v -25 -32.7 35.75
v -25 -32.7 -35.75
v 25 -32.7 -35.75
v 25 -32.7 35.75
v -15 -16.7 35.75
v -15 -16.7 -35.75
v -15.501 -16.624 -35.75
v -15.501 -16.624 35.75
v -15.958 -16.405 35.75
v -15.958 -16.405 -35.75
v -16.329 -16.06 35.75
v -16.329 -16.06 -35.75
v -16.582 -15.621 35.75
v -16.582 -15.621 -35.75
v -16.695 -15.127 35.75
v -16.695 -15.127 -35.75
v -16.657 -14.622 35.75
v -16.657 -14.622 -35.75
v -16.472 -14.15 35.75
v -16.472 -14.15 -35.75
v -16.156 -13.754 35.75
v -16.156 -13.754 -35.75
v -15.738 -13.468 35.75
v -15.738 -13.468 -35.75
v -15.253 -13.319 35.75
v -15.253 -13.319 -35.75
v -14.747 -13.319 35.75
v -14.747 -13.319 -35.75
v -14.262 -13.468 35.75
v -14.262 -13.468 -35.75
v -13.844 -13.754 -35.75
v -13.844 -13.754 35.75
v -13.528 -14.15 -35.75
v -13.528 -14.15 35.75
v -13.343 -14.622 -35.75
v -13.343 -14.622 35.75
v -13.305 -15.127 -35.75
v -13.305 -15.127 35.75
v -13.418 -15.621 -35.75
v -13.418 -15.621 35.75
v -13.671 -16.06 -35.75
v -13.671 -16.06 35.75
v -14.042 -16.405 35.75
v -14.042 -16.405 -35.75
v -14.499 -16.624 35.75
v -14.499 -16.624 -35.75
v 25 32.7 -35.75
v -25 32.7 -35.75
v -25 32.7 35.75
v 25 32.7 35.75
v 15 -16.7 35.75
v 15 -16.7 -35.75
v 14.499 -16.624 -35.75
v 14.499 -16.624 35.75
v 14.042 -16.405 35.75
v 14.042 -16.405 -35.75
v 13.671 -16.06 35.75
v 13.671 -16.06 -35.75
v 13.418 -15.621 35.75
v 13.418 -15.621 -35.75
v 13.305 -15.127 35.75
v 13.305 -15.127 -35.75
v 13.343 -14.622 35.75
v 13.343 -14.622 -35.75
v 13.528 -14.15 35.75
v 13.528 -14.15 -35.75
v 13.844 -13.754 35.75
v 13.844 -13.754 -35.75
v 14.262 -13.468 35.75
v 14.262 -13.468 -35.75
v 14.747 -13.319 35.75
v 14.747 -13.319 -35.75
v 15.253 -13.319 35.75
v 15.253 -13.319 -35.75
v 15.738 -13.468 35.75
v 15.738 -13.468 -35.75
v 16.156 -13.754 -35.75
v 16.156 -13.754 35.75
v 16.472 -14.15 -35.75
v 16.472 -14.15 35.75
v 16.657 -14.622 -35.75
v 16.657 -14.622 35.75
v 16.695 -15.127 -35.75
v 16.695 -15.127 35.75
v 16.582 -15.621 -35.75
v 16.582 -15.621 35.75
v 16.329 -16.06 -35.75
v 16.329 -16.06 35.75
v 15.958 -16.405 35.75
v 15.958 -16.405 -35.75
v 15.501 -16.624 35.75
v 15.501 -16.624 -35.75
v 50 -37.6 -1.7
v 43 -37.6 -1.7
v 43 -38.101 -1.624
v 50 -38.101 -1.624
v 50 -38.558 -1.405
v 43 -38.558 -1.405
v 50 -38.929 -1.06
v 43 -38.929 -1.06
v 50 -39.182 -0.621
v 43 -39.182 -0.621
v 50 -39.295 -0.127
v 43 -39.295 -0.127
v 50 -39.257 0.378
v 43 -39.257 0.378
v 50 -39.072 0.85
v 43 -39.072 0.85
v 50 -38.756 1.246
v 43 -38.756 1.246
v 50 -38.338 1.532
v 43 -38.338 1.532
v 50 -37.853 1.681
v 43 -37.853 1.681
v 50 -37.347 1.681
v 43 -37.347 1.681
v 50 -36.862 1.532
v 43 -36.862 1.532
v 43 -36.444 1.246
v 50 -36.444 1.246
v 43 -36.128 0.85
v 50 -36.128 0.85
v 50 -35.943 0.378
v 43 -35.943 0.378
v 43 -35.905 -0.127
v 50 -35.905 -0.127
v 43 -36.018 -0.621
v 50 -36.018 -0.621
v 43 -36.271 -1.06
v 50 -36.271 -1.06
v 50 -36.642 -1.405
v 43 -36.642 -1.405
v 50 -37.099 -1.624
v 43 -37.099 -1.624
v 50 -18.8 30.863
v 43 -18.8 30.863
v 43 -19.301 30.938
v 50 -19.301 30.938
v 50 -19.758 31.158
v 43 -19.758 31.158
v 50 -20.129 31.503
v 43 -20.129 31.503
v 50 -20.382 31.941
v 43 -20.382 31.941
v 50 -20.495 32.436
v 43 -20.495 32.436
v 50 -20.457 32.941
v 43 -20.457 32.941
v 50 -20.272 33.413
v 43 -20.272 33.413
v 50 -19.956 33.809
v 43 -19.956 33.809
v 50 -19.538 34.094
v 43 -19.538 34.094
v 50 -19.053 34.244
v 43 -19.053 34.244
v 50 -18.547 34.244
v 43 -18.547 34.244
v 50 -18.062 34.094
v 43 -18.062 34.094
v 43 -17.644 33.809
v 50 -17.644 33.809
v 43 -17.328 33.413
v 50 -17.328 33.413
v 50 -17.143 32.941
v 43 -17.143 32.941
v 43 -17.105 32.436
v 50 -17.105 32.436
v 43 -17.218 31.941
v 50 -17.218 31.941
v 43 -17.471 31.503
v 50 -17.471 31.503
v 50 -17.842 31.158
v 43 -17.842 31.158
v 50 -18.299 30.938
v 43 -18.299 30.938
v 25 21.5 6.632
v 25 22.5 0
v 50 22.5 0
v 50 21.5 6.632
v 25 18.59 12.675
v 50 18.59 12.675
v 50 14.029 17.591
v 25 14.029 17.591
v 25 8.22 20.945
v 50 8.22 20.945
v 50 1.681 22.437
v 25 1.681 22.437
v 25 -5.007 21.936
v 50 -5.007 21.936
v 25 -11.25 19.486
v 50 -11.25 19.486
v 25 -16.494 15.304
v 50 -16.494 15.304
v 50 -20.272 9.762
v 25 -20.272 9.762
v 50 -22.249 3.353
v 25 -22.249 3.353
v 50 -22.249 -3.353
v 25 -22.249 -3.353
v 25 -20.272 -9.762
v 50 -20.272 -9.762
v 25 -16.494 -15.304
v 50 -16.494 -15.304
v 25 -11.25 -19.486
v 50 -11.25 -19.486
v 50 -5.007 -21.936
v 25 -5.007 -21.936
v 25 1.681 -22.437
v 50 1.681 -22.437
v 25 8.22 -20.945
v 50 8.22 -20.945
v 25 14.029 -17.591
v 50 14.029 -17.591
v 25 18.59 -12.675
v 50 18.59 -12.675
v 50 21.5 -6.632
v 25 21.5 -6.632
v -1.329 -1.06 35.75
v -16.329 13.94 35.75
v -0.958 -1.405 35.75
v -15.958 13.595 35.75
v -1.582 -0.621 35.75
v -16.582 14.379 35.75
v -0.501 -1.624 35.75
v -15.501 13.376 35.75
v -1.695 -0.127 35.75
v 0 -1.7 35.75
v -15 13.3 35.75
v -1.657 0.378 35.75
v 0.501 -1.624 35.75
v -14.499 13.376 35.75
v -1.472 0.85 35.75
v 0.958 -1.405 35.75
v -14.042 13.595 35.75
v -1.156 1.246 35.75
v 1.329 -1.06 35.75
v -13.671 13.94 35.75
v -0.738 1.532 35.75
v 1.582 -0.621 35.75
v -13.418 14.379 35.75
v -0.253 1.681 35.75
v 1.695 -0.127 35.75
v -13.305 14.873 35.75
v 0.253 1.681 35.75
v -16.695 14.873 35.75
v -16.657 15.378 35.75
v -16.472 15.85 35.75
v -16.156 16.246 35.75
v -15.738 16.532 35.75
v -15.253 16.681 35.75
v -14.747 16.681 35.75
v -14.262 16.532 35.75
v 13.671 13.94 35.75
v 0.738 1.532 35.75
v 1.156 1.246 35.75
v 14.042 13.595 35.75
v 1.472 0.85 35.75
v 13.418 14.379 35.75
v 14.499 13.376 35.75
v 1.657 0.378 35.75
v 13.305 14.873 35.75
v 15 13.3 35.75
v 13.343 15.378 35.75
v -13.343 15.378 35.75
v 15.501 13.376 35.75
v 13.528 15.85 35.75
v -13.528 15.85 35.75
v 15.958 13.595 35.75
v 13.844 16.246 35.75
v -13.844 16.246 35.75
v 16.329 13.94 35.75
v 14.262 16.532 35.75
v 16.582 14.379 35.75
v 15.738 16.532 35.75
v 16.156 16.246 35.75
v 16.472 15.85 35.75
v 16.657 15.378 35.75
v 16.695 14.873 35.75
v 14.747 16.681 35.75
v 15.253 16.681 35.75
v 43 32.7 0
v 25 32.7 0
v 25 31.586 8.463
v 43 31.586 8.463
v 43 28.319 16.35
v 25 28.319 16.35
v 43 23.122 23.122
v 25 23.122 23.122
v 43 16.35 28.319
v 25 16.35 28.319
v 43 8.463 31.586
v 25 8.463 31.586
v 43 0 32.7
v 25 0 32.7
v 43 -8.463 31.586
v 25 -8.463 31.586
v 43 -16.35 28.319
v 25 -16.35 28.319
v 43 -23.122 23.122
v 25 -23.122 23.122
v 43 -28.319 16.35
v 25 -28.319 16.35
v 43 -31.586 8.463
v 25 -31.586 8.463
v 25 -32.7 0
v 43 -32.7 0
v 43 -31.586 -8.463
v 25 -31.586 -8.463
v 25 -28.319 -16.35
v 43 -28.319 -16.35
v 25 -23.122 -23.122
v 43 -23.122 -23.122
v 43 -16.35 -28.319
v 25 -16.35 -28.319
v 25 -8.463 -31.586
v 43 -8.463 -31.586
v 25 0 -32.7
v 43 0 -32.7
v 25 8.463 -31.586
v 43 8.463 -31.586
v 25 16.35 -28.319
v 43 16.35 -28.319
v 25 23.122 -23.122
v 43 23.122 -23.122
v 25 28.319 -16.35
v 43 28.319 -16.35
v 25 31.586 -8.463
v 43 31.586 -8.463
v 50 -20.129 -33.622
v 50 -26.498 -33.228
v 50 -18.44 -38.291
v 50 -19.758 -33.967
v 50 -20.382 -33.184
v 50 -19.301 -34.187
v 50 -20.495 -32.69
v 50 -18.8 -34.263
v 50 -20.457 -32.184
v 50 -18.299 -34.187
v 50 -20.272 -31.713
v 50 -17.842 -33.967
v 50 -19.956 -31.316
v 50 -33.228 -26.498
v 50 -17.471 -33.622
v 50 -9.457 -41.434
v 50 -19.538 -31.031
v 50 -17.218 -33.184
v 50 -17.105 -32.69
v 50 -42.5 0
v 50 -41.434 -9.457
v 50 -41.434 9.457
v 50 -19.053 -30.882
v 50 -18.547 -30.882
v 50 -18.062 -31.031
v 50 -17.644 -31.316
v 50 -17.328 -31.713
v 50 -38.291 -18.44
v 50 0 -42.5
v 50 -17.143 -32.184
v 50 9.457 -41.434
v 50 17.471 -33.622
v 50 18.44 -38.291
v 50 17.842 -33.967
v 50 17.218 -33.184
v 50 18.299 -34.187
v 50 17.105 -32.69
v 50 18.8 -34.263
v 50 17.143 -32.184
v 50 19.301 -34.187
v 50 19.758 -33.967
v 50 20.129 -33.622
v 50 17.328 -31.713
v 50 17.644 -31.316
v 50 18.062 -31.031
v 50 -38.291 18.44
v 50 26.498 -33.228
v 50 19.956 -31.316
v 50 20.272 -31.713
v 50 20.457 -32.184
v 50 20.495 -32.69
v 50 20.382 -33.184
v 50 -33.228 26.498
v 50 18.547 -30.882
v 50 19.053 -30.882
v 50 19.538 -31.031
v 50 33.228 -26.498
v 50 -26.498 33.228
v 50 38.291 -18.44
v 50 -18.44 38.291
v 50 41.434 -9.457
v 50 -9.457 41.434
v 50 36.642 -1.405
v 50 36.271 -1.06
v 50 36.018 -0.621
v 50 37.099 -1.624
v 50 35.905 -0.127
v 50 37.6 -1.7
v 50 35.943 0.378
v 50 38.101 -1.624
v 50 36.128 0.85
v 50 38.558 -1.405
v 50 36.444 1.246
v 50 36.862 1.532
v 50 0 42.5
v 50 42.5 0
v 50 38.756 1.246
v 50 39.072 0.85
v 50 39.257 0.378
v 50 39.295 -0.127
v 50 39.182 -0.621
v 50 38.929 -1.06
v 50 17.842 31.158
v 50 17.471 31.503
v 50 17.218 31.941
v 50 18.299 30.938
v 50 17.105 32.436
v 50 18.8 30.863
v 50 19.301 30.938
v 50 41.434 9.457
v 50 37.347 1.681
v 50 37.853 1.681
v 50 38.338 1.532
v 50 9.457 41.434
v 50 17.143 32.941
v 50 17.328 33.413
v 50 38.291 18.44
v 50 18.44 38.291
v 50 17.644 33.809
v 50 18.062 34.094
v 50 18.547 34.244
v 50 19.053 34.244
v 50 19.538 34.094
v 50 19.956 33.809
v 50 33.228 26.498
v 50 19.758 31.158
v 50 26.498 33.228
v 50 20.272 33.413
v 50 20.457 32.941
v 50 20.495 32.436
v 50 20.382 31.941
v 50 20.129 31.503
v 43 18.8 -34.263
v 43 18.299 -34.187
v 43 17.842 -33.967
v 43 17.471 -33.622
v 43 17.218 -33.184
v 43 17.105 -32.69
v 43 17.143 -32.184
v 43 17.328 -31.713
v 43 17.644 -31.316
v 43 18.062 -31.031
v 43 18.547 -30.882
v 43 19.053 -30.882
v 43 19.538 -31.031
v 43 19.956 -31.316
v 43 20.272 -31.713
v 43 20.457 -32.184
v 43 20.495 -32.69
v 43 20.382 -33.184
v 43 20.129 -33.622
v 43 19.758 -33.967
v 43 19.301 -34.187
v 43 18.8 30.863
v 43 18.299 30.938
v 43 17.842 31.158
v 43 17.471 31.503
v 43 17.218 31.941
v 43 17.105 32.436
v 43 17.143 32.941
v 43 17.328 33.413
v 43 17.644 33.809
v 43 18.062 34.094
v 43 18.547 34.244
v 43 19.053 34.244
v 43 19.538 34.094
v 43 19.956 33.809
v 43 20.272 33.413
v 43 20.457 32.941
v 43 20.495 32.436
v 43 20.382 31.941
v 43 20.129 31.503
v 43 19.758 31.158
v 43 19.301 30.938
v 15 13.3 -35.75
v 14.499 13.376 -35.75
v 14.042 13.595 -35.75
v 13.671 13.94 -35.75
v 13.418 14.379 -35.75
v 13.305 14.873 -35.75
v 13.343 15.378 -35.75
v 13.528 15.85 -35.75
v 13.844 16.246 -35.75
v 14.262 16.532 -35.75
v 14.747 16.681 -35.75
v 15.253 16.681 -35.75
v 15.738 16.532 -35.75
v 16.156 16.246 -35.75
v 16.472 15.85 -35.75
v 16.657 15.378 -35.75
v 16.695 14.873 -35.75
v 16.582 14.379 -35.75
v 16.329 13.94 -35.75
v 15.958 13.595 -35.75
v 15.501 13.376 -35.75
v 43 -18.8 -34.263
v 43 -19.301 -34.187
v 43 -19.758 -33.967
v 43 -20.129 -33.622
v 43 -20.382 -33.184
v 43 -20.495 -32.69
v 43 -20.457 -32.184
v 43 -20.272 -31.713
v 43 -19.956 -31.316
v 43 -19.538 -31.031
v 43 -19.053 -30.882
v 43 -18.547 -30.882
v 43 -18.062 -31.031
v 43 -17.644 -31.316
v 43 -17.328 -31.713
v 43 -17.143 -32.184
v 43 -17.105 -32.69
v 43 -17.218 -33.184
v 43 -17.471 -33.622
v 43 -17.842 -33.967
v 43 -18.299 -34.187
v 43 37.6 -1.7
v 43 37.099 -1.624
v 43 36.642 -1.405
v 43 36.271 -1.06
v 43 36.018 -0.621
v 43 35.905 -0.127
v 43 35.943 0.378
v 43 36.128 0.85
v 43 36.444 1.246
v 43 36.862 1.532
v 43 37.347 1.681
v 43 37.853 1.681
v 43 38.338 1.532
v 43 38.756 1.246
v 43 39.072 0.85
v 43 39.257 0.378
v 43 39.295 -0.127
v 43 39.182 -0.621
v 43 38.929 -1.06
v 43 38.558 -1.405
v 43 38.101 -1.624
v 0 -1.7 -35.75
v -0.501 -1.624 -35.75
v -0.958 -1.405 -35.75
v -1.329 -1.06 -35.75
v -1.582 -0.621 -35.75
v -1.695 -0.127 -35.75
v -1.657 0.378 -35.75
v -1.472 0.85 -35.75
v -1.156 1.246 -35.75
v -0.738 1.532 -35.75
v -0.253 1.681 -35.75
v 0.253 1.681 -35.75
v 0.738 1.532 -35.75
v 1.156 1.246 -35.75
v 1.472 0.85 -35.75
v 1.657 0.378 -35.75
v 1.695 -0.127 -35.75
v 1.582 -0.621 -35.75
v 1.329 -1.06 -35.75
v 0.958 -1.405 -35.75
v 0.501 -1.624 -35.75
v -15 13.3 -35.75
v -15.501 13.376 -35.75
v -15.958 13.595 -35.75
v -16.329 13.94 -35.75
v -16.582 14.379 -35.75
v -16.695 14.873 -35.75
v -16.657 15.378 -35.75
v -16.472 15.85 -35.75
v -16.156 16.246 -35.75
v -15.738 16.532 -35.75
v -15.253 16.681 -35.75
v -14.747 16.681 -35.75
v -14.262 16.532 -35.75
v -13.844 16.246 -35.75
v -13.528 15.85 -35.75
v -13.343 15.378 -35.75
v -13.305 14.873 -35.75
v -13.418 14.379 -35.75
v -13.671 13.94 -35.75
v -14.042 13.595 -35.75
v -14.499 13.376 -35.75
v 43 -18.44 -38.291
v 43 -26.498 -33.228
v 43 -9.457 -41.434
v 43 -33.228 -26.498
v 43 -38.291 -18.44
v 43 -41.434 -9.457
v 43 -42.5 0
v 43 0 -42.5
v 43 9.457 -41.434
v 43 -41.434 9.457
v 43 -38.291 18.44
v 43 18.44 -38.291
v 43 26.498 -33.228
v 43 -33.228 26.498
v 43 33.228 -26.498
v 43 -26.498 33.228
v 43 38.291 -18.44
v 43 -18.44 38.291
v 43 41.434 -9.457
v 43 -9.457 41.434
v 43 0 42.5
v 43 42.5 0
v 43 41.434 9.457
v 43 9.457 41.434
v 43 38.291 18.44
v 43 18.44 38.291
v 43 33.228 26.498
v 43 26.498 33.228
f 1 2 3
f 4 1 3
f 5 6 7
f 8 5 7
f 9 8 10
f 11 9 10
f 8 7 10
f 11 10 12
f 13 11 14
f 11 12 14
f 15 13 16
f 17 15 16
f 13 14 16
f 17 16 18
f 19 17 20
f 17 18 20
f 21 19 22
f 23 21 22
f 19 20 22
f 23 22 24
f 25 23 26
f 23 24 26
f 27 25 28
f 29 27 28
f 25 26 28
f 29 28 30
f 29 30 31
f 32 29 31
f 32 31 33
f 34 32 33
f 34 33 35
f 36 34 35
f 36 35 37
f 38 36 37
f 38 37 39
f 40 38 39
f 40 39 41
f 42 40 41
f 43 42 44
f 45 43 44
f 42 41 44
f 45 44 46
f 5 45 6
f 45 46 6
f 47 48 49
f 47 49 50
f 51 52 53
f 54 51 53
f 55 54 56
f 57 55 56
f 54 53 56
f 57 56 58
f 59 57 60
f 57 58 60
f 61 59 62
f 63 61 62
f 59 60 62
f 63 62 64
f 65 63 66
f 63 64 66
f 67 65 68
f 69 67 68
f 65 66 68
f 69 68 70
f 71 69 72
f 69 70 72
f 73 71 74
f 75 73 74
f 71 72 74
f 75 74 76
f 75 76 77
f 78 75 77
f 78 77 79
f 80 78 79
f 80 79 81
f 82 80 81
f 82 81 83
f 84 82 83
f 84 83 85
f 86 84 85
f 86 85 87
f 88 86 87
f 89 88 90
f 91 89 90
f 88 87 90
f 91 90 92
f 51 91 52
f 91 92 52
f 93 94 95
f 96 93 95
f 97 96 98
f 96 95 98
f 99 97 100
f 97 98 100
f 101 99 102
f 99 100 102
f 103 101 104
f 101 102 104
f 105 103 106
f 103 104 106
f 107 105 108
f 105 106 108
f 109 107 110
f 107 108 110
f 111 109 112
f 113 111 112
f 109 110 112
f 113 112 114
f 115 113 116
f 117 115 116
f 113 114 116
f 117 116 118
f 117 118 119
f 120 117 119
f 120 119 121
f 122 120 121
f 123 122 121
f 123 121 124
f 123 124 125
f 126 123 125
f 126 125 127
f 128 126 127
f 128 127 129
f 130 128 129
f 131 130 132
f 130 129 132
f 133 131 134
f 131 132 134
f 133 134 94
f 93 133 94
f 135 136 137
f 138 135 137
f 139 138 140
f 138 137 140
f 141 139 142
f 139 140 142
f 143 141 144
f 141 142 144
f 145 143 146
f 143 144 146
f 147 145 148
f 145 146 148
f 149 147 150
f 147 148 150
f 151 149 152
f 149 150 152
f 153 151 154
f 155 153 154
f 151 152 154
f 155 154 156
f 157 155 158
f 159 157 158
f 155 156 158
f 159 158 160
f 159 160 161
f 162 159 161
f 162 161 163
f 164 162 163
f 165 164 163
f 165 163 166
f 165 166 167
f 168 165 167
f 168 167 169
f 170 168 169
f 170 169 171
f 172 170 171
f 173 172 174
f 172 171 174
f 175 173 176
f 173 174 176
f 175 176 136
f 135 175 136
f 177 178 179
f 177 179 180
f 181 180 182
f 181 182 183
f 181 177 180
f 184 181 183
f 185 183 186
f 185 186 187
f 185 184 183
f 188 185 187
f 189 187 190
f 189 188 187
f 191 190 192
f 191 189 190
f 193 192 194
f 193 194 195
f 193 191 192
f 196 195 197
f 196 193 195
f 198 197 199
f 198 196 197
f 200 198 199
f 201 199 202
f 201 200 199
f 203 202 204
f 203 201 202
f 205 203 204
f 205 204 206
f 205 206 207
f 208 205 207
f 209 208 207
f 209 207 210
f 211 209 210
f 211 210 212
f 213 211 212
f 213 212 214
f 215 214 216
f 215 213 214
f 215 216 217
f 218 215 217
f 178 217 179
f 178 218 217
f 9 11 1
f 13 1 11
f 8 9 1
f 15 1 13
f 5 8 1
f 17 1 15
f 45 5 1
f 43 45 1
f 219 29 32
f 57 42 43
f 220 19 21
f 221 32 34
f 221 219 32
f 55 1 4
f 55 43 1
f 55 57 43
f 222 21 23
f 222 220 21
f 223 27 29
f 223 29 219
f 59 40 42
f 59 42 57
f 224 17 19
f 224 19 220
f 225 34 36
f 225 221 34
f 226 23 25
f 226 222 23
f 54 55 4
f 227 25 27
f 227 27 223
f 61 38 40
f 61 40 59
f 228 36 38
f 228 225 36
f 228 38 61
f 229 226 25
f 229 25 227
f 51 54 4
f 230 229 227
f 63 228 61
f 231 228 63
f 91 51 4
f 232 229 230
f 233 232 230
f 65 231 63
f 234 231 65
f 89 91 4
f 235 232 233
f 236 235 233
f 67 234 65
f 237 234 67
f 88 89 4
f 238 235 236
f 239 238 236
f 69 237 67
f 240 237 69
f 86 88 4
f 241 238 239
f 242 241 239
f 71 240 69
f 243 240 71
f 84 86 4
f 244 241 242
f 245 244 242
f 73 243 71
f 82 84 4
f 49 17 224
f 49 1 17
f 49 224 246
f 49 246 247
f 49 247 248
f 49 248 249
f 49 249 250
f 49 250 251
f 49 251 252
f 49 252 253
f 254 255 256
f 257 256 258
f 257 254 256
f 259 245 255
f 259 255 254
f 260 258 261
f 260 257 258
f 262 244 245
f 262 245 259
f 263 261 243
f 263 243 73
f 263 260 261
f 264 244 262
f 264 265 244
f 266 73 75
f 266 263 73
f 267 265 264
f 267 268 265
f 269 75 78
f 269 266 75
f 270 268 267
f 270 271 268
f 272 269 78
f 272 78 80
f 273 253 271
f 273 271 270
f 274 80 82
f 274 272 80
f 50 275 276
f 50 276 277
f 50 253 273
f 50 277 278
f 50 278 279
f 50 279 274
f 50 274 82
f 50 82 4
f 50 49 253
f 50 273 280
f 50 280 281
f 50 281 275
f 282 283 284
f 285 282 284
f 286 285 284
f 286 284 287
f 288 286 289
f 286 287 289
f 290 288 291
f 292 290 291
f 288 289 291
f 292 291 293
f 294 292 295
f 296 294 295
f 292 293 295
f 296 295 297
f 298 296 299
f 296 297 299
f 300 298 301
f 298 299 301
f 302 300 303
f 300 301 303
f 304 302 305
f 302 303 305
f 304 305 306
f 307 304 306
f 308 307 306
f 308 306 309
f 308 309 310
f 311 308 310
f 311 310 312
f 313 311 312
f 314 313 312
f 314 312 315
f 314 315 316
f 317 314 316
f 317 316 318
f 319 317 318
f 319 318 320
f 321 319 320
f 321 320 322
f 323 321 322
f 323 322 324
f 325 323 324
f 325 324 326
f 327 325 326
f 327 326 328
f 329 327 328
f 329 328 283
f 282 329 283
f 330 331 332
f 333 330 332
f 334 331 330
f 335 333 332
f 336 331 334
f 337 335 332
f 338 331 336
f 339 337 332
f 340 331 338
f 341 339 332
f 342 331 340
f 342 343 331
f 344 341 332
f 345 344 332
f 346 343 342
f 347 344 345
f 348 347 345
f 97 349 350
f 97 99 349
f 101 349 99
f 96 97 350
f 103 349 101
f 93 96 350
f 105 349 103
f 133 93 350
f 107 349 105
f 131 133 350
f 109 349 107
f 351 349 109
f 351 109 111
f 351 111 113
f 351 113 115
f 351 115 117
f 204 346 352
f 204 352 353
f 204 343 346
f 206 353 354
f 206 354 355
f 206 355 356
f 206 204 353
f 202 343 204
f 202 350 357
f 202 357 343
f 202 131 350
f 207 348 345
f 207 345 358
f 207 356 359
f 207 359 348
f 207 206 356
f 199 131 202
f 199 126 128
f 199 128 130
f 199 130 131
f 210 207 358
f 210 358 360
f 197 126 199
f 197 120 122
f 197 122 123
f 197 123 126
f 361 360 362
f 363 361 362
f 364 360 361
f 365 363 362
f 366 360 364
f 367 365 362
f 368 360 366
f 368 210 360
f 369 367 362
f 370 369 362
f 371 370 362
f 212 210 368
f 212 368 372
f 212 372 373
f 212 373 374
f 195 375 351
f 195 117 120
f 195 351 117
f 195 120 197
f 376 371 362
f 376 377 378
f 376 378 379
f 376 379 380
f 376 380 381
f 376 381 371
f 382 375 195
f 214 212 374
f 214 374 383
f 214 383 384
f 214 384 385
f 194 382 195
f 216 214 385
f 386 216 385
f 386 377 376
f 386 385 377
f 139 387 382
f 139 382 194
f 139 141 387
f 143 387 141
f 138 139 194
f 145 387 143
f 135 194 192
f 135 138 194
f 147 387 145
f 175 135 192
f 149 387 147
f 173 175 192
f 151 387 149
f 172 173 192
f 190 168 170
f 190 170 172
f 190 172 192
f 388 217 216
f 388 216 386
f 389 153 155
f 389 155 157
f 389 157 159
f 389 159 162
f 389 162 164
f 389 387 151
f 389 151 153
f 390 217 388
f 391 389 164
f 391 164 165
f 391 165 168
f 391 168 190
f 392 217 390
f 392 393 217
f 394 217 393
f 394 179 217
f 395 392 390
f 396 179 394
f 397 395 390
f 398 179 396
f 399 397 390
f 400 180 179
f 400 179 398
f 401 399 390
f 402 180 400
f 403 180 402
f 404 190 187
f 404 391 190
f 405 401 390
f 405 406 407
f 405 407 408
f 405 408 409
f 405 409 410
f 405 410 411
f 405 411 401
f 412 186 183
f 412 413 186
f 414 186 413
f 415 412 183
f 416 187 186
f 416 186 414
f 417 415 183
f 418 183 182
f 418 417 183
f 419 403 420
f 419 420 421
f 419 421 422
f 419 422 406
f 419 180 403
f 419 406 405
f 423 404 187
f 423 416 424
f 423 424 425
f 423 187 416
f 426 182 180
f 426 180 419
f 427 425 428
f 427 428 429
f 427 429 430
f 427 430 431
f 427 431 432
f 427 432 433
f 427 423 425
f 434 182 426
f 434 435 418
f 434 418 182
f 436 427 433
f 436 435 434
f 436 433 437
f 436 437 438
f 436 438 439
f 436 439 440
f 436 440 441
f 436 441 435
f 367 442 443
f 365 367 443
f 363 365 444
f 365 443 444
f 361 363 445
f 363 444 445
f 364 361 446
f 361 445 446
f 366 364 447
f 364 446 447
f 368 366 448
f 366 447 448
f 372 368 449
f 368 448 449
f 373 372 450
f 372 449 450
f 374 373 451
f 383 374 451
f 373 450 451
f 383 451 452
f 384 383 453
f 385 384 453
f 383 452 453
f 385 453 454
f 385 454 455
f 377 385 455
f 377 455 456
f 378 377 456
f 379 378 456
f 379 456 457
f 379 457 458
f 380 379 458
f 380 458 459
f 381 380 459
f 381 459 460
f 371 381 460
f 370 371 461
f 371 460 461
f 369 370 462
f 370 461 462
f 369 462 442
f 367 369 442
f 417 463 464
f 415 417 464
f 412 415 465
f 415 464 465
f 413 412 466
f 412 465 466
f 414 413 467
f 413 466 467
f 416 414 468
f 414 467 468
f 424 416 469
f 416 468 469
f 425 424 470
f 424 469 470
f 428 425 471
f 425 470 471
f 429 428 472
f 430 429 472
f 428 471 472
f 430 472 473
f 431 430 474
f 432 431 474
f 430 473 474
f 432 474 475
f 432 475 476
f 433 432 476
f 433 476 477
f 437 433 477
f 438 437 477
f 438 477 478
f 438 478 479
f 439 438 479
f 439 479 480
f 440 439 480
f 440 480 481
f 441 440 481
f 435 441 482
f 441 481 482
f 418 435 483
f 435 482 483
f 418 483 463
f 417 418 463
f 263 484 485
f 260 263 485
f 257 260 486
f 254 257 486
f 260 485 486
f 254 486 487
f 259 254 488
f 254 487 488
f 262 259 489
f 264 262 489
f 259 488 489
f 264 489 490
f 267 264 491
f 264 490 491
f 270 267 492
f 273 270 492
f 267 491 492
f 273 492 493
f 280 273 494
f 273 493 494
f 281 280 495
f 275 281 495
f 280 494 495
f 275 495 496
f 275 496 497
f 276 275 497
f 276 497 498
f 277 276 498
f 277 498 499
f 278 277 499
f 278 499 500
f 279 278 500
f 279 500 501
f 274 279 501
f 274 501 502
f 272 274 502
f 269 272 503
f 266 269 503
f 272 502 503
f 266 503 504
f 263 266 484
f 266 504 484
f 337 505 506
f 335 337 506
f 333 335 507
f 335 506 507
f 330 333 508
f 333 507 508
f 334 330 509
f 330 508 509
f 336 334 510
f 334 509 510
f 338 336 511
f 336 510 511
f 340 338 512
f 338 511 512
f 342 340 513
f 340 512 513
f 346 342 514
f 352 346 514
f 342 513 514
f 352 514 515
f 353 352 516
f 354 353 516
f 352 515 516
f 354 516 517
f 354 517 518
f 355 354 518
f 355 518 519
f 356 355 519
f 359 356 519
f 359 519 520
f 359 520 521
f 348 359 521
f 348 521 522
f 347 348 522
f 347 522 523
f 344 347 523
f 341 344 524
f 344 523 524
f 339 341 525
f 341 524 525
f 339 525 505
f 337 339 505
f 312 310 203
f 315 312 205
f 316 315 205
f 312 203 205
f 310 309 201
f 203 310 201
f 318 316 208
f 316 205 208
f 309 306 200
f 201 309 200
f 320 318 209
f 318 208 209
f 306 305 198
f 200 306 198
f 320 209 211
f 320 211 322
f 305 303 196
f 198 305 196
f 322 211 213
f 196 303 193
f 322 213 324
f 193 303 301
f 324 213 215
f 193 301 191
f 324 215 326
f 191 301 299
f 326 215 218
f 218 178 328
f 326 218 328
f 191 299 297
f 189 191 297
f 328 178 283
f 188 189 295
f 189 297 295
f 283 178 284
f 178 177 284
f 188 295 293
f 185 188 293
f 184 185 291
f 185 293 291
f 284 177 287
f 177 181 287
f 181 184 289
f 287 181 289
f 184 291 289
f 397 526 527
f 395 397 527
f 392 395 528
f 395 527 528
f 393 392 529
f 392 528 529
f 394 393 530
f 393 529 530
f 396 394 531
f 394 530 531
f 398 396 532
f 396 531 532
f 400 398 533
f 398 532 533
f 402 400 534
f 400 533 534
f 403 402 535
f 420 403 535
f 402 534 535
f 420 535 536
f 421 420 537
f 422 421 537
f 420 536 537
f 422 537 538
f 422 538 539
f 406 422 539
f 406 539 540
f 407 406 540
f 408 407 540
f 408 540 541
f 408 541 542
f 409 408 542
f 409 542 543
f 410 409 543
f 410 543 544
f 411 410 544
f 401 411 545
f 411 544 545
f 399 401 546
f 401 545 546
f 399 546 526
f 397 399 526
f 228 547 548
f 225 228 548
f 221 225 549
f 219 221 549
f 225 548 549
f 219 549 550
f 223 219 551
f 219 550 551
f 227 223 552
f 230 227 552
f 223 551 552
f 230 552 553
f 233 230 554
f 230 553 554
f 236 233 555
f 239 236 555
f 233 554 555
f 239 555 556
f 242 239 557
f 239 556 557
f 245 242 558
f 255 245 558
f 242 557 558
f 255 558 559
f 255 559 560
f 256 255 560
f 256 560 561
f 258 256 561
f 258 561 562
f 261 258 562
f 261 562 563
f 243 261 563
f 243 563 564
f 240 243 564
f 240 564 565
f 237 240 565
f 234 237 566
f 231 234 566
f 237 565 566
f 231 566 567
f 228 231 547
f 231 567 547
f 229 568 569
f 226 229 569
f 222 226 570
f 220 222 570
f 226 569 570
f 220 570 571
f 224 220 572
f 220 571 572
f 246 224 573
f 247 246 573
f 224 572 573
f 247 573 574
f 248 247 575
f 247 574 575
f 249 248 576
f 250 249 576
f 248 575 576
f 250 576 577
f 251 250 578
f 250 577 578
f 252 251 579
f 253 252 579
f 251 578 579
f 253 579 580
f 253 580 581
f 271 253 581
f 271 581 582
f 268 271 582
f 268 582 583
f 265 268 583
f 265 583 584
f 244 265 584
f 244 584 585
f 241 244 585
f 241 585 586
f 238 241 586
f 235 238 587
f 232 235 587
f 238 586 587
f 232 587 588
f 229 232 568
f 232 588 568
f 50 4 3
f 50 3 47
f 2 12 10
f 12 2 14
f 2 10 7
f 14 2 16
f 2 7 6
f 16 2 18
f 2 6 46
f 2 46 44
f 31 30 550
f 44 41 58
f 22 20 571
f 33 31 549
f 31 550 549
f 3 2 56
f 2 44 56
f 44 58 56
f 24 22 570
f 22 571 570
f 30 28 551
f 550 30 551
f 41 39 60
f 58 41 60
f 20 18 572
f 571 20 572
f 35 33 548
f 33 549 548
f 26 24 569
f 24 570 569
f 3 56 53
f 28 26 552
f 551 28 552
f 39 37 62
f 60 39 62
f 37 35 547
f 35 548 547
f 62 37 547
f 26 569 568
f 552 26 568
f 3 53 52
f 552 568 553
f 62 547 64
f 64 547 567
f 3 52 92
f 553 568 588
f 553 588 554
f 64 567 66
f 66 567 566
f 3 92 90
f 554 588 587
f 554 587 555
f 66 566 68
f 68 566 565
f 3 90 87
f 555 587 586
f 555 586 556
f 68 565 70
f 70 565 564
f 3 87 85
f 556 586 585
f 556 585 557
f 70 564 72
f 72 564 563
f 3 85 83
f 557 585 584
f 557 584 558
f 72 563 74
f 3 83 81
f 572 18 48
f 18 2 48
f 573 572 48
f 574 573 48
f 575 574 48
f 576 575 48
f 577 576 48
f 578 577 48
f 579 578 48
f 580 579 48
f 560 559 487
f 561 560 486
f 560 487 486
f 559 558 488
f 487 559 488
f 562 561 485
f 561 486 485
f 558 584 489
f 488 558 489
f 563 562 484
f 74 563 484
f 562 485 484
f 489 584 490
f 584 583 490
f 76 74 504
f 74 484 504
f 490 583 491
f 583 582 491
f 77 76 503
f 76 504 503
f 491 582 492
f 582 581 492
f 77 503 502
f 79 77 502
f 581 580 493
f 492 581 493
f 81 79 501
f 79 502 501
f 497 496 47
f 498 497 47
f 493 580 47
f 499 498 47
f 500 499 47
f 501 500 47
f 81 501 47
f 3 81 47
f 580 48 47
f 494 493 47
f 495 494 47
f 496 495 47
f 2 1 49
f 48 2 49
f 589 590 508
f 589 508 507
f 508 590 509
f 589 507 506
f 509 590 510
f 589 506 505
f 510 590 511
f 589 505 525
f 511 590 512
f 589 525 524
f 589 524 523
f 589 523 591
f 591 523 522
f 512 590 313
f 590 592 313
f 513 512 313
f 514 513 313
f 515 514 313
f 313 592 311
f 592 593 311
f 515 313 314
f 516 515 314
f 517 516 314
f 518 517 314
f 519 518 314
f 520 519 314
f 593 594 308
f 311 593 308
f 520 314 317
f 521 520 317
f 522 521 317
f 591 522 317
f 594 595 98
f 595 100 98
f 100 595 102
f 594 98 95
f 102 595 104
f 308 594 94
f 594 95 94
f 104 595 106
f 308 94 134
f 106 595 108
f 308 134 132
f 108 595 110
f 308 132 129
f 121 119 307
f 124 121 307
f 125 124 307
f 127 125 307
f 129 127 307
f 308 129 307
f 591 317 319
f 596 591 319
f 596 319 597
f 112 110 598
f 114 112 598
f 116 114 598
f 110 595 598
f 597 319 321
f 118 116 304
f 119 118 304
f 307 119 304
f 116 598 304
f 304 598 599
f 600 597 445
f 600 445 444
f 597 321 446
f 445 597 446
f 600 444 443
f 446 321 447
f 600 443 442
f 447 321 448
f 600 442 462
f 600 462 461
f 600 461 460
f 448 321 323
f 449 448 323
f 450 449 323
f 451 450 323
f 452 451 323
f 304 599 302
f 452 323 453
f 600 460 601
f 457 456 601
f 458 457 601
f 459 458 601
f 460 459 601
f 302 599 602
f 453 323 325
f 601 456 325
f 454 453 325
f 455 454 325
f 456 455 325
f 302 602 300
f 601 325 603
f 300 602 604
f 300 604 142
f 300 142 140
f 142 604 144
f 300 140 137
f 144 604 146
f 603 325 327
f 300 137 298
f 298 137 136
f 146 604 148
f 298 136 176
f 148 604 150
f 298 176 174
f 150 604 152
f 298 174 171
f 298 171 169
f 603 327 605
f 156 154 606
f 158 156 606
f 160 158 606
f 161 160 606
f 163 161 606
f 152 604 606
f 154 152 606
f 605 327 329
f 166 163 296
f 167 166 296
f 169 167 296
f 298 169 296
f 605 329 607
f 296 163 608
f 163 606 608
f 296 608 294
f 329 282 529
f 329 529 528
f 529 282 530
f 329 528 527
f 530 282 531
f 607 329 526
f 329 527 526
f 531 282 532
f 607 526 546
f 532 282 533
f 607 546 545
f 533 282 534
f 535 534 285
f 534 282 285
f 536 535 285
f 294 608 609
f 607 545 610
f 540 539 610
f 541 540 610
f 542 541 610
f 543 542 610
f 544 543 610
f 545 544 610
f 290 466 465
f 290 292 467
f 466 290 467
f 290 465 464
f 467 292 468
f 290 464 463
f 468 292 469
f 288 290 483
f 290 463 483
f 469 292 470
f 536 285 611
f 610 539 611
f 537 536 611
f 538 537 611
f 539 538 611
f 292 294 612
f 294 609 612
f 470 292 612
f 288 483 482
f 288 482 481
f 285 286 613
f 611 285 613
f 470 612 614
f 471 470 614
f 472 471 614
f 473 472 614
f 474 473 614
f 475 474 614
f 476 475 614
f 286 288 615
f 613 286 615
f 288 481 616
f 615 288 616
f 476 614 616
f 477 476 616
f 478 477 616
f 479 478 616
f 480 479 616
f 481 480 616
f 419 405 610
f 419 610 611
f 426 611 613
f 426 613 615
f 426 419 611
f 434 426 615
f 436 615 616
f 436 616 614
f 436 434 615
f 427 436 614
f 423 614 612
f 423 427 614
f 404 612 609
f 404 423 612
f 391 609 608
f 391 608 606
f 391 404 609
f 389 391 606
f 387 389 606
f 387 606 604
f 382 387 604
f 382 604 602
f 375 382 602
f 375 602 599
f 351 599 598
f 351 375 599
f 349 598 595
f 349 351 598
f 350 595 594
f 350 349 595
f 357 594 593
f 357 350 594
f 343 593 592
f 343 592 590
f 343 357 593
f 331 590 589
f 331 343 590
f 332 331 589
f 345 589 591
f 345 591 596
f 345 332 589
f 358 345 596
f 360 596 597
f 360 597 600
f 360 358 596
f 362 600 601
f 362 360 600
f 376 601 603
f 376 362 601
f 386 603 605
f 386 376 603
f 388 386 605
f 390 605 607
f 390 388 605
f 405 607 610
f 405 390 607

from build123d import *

# Parameters (mm, degrees)
CROQUIS1_W                            = 50
CROQUIS1_H                            = 65.4
SALIENTE_EXTRUIR1_DEPTH               = 35.75
CROQUIS2_R                            = 32.7
CROQUIS2_R_2                          = 22.5
SALIENTE_EXTRUIR2_DEPTH               = 25
CROQUIS3_R                            = 42.5
CROQUIS3_R_2                          = 32.7
SALIENTE_EXTRUIR3_DEPTH               = 7
CROQUIS5_W                            = 1.7
CROQUIS5_H                            = 7.001
TALADRO_DE_MARGEN_PARA_M31_AT_2_COUNT = 2
TALADRO_DE_MARGEN_PARA_M31_AT_2_PITCH = 37.6
TALADRO_DE_MARGEN_PARA_M31_AT_3_COUNT = 2
TALADRO_DE_MARGEN_PARA_M31_AT_3_PITCH = 65.125110365
TALADRO_DE_MARGEN_PARA_M31_AT_4_COUNT = 2
TALADRO_DE_MARGEN_PARA_M31_AT_4_PITCH = 75.2
TALADRO_DE_MARGEN_PARA_M31_AT_5_COUNT = 2
TALADRO_DE_MARGEN_PARA_M31_AT_5_PITCH = 65.125110365
TALADRO_DE_MARGEN_PARA_M31_AT_6_COUNT = 2
TALADRO_DE_MARGEN_PARA_M31_AT_6_PITCH = 37.6
CROQUIS12_W                           = 1.7
CROQUIS12_H                           = 78.25
TALADRO_DE_MARGEN_PARA_M32_AT_2_COUNT = 2
TALADRO_DE_MARGEN_PARA_M32_AT_2_PITCH = 42.426406871
TALADRO_DE_MARGEN_PARA_M32_AT_3_COUNT = 2
TALADRO_DE_MARGEN_PARA_M32_AT_3_PITCH = 30
TALADRO_DE_MARGEN_PARA_M32_AT_4_COUNT = 2
TALADRO_DE_MARGEN_PARA_M32_AT_4_PITCH = 30
TALADRO_DE_MARGEN_PARA_M32_AT_5_COUNT = 2
TALADRO_DE_MARGEN_PARA_M32_AT_5_PITCH = 21.213203436


with BuildPart() as part:
    # Croquis1 → Saliente-Extruir1 (new, symmetric)
    with BuildSketch(Plane.XY):
        Rectangle(CROQUIS1_W, CROQUIS1_H)
    extrude(amount=SALIENTE_EXTRUIR1_DEPTH, both=True)

    # Croquis12 → Taladro de margen para M32 (revolve, cut)
    with BuildSketch(Plane(origin=(15, 15, 35.75), x_dir=(0, -1, 0), z_dir=(1, 0, 0))):
        with Locations((0.85, 39.125)):
            Rectangle(CROQUIS12_W, CROQUIS12_H)
    taladro_de_margen_para_m32 = revolve(axis=Axis((15, 15, 42.1), (0, 0, -1)), mode=Mode.SUBTRACT)

    # Taladro de margen para M32 at 2: Taladro de margen para M32 ×2
    with Locations(*[Vector(-0.7071067811865475, -0.7071067811865476, 0) * (i * TALADRO_DE_MARGEN_PARA_M32_AT_2_PITCH) for i in range(1, TALADRO_DE_MARGEN_PARA_M32_AT_2_COUNT)]):
        add(taladro_de_margen_para_m32, mode=Mode.SUBTRACT)

    # Taladro de margen para M32 at 3: Taladro de margen para M32 ×2
    with Locations(*[(-i * TALADRO_DE_MARGEN_PARA_M32_AT_3_PITCH, 0, 0) for i in range(1, TALADRO_DE_MARGEN_PARA_M32_AT_3_COUNT)]):
        add(taladro_de_margen_para_m32, mode=Mode.SUBTRACT)

    # Taladro de margen para M32 at 4: Taladro de margen para M32 ×2
    with Locations(*[(0, -i * TALADRO_DE_MARGEN_PARA_M32_AT_4_PITCH, 0) for i in range(1, TALADRO_DE_MARGEN_PARA_M32_AT_4_COUNT)]):
        add(taladro_de_margen_para_m32, mode=Mode.SUBTRACT)

    # Taladro de margen para M32 at 5: Taladro de margen para M32 ×2
    with Locations(*[Vector(-0.7071067811865476, -0.7071067811865476, 0) * (i * TALADRO_DE_MARGEN_PARA_M32_AT_5_PITCH) for i in range(1, TALADRO_DE_MARGEN_PARA_M32_AT_5_COUNT)]):
        add(taladro_de_margen_para_m32, mode=Mode.SUBTRACT)


with BuildPart() as body_2:
    # Croquis2 → Saliente-Extruir2 (new body)
    with BuildSketch(Plane(origin=(25, 0, 0), x_dir=(0, 0, -1), z_dir=(1, 0, 0))):
        with Locations(Location((0, 0, 0), (0, 0, 90))):
            Circle(CROQUIS2_R)
        with Locations(Location((0, 0, 0), (0, 0, 90))):
            Circle(CROQUIS2_R_2, mode=Mode.SUBTRACT)
    extrude(amount=SALIENTE_EXTRUIR2_DEPTH)

    # Croquis3 → Saliente-Extruir3 (add)
    with BuildSketch(Plane(origin=(50, 0, 0), x_dir=(0, 0, -1), z_dir=(1, 0, 0))):
        with Locations(Location((0, 0, 0), (0, 0, 90))):
            Circle(CROQUIS3_R)
        with Locations(Location((0, 0, 0), (0, 0, 90))):
            Circle(CROQUIS3_R_2, mode=Mode.SUBTRACT)
    extrude(amount=-SALIENTE_EXTRUIR3_DEPTH)

    # Croquis5 → Taladro de margen para M31 (revolve, cut)
    with BuildSketch(Plane(origin=(50, 18.8, 32.562555182), x_dir=(0, 0, -1), z_dir=(0, 1, 0))):
        with Locations((0.85, 3.5005)):
            Rectangle(CROQUIS5_W, CROQUIS5_H)
    taladro_de_margen_para_m31 = revolve(axis=Axis((56.35, 18.8, 32.562555182), (-1, 0, 0)), mode=Mode.SUBTRACT)

    # Taladro de margen para M31 at 2: Taladro de margen para M31 ×2
    with Locations(*[Vector(0, 0.5000000000000369, -0.8660254037844175) * (i * TALADRO_DE_MARGEN_PARA_M31_AT_2_PITCH) for i in range(1, TALADRO_DE_MARGEN_PARA_M31_AT_2_COUNT)]):
        add(taladro_de_margen_para_m31, mode=Mode.SUBTRACT)

    # Taladro de margen para M31 at 3: Taladro de margen para M31 ×2
    with Locations(*[(0, 0, -i * TALADRO_DE_MARGEN_PARA_M31_AT_3_PITCH) for i in range(1, TALADRO_DE_MARGEN_PARA_M31_AT_3_COUNT)]):
        add(taladro_de_margen_para_m31, mode=Mode.SUBTRACT)

    # Taladro de margen para M31 at 4: Taladro de margen para M31 ×2
    with Locations(*[Vector(0, -0.49999999999996314, -0.8660254037844598) * (i * TALADRO_DE_MARGEN_PARA_M31_AT_4_PITCH) for i in range(1, TALADRO_DE_MARGEN_PARA_M31_AT_4_COUNT)]):
        add(taladro_de_margen_para_m31, mode=Mode.SUBTRACT)

    # Taladro de margen para M31 at 5: Taladro de margen para M31 ×2
    with Locations(*[Vector(0, -0.8660254037844175, -0.5000000000000367) * (i * TALADRO_DE_MARGEN_PARA_M31_AT_5_PITCH) for i in range(1, TALADRO_DE_MARGEN_PARA_M31_AT_5_COUNT)]):
        add(taladro_de_margen_para_m31, mode=Mode.SUBTRACT)

    # Taladro de margen para M31 at 6: Taladro de margen para M31 ×2
    with Locations(*[(0, -i * TALADRO_DE_MARGEN_PARA_M31_AT_6_PITCH, 0) for i in range(1, TALADRO_DE_MARGEN_PARA_M31_AT_6_COUNT)]):
        add(taladro_de_margen_para_m31, mode=Mode.SUBTRACT)


solid = Compound([part.part, body_2.part])
